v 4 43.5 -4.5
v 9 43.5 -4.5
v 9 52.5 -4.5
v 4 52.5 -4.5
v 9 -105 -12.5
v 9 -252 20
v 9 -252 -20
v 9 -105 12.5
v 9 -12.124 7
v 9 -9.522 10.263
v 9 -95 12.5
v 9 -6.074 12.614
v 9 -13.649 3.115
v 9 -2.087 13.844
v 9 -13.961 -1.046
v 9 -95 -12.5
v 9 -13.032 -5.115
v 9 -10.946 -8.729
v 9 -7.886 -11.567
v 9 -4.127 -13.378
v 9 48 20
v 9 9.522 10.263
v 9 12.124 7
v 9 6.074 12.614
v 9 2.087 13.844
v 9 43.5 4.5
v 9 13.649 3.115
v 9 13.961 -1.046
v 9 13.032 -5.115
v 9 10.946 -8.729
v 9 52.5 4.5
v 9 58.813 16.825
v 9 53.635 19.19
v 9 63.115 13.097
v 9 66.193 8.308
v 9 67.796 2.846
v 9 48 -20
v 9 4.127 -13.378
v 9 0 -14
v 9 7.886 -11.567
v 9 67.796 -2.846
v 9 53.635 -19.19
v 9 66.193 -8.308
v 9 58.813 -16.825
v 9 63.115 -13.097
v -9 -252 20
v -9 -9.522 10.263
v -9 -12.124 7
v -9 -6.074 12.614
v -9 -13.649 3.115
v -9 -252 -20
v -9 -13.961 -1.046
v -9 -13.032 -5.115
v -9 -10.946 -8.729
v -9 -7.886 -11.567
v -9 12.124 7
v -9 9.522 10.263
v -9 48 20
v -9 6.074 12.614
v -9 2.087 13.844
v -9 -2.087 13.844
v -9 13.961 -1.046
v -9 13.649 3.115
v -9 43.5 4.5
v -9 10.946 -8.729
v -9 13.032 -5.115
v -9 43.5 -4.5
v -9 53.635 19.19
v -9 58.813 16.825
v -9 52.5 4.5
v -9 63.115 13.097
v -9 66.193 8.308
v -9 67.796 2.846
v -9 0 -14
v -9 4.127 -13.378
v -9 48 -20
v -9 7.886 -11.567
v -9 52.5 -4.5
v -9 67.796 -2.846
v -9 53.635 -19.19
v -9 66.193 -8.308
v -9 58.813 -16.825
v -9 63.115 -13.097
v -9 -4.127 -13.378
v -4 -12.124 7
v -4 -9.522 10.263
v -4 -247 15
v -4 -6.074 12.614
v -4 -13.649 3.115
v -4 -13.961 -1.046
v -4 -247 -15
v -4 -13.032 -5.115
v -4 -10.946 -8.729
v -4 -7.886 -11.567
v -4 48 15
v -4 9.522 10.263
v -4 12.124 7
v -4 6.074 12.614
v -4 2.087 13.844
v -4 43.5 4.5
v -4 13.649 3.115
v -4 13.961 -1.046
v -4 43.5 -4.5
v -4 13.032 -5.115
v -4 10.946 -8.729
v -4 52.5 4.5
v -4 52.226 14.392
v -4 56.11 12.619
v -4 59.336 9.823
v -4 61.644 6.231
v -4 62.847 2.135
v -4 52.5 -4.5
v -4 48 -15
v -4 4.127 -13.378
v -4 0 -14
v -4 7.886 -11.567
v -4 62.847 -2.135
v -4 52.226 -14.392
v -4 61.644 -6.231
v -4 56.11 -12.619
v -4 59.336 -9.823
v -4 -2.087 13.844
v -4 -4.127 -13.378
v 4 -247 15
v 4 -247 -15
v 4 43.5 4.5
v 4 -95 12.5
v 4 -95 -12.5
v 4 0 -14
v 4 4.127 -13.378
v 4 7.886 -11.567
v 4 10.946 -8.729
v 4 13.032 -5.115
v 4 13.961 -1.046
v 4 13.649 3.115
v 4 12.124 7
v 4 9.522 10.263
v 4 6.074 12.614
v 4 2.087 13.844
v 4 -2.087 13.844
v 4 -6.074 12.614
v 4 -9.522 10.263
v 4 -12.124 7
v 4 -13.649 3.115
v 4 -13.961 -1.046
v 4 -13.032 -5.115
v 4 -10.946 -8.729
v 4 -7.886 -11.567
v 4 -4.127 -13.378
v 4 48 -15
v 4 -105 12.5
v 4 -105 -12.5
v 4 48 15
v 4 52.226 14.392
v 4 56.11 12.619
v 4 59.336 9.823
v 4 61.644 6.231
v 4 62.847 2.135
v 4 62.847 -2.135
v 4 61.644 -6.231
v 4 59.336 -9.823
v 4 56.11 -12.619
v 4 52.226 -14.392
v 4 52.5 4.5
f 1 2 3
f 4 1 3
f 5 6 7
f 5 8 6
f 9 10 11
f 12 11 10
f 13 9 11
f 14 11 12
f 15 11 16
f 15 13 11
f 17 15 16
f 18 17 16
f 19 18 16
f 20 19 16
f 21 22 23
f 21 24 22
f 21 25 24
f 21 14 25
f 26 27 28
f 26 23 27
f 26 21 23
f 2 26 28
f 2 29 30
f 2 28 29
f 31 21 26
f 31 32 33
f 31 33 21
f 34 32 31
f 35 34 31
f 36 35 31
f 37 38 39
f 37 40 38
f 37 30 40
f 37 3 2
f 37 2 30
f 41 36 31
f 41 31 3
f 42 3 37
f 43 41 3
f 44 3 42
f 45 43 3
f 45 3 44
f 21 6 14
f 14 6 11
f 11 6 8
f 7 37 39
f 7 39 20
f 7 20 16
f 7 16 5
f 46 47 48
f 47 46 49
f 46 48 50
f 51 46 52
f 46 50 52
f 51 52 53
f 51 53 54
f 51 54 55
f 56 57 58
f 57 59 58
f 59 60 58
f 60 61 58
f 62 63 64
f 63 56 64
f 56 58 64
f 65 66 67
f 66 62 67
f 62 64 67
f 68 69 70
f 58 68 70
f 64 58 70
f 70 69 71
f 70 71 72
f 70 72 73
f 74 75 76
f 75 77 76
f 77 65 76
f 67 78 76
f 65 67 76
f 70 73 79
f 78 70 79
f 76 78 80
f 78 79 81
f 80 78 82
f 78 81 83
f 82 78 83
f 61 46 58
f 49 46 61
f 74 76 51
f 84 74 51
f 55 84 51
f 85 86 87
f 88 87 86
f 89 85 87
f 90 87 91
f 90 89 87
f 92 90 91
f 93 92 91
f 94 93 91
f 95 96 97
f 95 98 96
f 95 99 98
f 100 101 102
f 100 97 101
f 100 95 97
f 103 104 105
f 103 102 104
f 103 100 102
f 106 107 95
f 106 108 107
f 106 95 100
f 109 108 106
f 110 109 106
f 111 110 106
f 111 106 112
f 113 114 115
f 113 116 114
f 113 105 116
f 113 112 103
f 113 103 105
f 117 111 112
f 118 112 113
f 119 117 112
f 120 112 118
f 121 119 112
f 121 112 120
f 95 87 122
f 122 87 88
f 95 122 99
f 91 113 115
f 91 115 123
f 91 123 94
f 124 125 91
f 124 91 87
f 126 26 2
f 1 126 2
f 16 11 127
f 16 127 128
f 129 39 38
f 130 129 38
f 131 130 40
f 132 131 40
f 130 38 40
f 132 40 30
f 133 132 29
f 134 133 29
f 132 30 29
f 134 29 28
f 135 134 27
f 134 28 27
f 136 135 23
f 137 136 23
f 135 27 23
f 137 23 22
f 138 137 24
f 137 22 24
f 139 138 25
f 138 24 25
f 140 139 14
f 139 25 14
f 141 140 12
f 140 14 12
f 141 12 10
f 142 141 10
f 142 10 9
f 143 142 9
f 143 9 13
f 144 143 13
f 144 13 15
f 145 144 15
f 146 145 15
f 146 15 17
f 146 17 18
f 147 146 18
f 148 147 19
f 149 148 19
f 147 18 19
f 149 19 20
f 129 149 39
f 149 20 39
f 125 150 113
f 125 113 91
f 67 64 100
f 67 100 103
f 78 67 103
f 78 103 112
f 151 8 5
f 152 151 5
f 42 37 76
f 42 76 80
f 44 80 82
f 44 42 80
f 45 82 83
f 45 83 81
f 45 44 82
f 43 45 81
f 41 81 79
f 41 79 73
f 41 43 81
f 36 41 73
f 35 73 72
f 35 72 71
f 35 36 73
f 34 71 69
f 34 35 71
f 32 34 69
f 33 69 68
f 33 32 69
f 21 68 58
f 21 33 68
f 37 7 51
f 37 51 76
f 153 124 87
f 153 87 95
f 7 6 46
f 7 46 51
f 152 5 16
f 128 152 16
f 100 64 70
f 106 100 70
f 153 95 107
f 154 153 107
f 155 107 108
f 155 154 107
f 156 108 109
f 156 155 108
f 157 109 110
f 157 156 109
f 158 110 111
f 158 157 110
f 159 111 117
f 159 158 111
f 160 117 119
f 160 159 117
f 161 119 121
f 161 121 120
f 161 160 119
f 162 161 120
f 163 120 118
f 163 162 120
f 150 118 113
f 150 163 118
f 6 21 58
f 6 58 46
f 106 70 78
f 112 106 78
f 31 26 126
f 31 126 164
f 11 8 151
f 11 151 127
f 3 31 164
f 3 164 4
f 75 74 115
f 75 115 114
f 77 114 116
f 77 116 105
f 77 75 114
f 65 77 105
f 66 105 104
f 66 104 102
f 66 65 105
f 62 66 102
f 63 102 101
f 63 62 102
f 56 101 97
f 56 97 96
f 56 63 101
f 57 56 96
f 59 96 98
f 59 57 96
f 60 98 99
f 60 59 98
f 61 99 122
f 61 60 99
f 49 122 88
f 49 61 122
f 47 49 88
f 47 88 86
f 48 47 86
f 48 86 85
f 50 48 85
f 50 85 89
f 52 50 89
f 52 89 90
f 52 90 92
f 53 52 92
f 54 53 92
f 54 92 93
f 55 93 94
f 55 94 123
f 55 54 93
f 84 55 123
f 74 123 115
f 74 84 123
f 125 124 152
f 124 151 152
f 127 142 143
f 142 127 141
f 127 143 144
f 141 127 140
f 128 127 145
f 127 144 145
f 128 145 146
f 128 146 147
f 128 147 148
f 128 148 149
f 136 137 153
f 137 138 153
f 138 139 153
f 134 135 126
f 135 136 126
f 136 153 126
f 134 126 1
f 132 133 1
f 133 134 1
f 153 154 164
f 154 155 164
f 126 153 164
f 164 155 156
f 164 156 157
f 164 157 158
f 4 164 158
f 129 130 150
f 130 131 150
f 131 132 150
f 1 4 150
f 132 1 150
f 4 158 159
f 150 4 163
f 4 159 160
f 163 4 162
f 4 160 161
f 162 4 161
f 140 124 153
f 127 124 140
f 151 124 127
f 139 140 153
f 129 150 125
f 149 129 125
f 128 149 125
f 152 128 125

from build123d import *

# Parameters (mm, degrees)
BOSS_EXTRUDE1_START = -9
SKETCH2_R           = 14
SKETCH2_W           = 9
SKETCH2_H           = 9
BOSS_EXTRUDE1_DEPTH = 5
BOSS_EXTRUDE2_START = -4
BOSS_EXTRUDE2_DEPTH = 4
CUT_EXTRUDE1_START  = 9
SKETCH4_W           = 25
SKETCH4_H           = 10
CUT_EXTRUDE1_DEPTH  = 13


with BuildPart() as part:
    # Sketch2 → Boss-Extrude1 (new body)
    with BuildSketch(Plane(origin=(0, 0, 0), x_dir=(0, 0, -1), z_dir=(1, 0, 0)).offset(BOSS_EXTRUDE1_START)):
        with BuildLine():
            Line((-20, 48), (-20, -252))
            Line((-20, -252), (20, -252))
            Line((20, -252), (20, 48))
            ThreePointArc((20, 48), (0, 68), (-20, 48))
        make_face()
        Circle(SKETCH2_R, mode=Mode.SUBTRACT)
        with Locations((0, 48)):
            Rectangle(SKETCH2_W, SKETCH2_H, mode=Mode.SUBTRACT)
    extrude(amount=BOSS_EXTRUDE1_DEPTH)

    # Sketch2<6> → Boss-Extrude2 (add)
    with BuildSketch(Plane(origin=(0, 0, 0), x_dir=(0, 0, -1), z_dir=(1, 0, 0)).offset(BOSS_EXTRUDE2_START)):
        with BuildLine():
            Line((-20, 48), (-20, -252))
            Line((-20, -252), (20, -252))
            Line((20, -252), (20, 48))
            ThreePointArc((20, 48), (0, 68), (-20, 48))
        make_face()
        with BuildLine():
            Line((15, 48), (15, -247))
            Line((15, -247), (-15, -247))
            Line((-15, -247), (-15, 48))
            ThreePointArc((-15, 48), (0, 63), (15, 48))
        make_face(mode=Mode.SUBTRACT)
    extrude(amount=BOSS_EXTRUDE2_DEPTH)

    # Mirror1: part across plane


with BuildPart() as part_1:
    add(part.part)
    add(part.part.mirror(Plane(origin=(0, 0, 0), x_dir=(0, 0, 1), z_dir=(1, 0, 0))))

    # Sketch4 → Cut-Extrude1 (cut)
    with BuildSketch(Plane(origin=(0, 0, 0), x_dir=(0, 0, -1), z_dir=(1, 0, 0)).offset(CUT_EXTRUDE1_START)):
        with Locations((0, -100)):
            Rectangle(SKETCH4_W, SKETCH4_H)
    extrude(amount=-CUT_EXTRUDE1_DEPTH, mode=Mode.SUBTRACT)


solid = part_1.part
